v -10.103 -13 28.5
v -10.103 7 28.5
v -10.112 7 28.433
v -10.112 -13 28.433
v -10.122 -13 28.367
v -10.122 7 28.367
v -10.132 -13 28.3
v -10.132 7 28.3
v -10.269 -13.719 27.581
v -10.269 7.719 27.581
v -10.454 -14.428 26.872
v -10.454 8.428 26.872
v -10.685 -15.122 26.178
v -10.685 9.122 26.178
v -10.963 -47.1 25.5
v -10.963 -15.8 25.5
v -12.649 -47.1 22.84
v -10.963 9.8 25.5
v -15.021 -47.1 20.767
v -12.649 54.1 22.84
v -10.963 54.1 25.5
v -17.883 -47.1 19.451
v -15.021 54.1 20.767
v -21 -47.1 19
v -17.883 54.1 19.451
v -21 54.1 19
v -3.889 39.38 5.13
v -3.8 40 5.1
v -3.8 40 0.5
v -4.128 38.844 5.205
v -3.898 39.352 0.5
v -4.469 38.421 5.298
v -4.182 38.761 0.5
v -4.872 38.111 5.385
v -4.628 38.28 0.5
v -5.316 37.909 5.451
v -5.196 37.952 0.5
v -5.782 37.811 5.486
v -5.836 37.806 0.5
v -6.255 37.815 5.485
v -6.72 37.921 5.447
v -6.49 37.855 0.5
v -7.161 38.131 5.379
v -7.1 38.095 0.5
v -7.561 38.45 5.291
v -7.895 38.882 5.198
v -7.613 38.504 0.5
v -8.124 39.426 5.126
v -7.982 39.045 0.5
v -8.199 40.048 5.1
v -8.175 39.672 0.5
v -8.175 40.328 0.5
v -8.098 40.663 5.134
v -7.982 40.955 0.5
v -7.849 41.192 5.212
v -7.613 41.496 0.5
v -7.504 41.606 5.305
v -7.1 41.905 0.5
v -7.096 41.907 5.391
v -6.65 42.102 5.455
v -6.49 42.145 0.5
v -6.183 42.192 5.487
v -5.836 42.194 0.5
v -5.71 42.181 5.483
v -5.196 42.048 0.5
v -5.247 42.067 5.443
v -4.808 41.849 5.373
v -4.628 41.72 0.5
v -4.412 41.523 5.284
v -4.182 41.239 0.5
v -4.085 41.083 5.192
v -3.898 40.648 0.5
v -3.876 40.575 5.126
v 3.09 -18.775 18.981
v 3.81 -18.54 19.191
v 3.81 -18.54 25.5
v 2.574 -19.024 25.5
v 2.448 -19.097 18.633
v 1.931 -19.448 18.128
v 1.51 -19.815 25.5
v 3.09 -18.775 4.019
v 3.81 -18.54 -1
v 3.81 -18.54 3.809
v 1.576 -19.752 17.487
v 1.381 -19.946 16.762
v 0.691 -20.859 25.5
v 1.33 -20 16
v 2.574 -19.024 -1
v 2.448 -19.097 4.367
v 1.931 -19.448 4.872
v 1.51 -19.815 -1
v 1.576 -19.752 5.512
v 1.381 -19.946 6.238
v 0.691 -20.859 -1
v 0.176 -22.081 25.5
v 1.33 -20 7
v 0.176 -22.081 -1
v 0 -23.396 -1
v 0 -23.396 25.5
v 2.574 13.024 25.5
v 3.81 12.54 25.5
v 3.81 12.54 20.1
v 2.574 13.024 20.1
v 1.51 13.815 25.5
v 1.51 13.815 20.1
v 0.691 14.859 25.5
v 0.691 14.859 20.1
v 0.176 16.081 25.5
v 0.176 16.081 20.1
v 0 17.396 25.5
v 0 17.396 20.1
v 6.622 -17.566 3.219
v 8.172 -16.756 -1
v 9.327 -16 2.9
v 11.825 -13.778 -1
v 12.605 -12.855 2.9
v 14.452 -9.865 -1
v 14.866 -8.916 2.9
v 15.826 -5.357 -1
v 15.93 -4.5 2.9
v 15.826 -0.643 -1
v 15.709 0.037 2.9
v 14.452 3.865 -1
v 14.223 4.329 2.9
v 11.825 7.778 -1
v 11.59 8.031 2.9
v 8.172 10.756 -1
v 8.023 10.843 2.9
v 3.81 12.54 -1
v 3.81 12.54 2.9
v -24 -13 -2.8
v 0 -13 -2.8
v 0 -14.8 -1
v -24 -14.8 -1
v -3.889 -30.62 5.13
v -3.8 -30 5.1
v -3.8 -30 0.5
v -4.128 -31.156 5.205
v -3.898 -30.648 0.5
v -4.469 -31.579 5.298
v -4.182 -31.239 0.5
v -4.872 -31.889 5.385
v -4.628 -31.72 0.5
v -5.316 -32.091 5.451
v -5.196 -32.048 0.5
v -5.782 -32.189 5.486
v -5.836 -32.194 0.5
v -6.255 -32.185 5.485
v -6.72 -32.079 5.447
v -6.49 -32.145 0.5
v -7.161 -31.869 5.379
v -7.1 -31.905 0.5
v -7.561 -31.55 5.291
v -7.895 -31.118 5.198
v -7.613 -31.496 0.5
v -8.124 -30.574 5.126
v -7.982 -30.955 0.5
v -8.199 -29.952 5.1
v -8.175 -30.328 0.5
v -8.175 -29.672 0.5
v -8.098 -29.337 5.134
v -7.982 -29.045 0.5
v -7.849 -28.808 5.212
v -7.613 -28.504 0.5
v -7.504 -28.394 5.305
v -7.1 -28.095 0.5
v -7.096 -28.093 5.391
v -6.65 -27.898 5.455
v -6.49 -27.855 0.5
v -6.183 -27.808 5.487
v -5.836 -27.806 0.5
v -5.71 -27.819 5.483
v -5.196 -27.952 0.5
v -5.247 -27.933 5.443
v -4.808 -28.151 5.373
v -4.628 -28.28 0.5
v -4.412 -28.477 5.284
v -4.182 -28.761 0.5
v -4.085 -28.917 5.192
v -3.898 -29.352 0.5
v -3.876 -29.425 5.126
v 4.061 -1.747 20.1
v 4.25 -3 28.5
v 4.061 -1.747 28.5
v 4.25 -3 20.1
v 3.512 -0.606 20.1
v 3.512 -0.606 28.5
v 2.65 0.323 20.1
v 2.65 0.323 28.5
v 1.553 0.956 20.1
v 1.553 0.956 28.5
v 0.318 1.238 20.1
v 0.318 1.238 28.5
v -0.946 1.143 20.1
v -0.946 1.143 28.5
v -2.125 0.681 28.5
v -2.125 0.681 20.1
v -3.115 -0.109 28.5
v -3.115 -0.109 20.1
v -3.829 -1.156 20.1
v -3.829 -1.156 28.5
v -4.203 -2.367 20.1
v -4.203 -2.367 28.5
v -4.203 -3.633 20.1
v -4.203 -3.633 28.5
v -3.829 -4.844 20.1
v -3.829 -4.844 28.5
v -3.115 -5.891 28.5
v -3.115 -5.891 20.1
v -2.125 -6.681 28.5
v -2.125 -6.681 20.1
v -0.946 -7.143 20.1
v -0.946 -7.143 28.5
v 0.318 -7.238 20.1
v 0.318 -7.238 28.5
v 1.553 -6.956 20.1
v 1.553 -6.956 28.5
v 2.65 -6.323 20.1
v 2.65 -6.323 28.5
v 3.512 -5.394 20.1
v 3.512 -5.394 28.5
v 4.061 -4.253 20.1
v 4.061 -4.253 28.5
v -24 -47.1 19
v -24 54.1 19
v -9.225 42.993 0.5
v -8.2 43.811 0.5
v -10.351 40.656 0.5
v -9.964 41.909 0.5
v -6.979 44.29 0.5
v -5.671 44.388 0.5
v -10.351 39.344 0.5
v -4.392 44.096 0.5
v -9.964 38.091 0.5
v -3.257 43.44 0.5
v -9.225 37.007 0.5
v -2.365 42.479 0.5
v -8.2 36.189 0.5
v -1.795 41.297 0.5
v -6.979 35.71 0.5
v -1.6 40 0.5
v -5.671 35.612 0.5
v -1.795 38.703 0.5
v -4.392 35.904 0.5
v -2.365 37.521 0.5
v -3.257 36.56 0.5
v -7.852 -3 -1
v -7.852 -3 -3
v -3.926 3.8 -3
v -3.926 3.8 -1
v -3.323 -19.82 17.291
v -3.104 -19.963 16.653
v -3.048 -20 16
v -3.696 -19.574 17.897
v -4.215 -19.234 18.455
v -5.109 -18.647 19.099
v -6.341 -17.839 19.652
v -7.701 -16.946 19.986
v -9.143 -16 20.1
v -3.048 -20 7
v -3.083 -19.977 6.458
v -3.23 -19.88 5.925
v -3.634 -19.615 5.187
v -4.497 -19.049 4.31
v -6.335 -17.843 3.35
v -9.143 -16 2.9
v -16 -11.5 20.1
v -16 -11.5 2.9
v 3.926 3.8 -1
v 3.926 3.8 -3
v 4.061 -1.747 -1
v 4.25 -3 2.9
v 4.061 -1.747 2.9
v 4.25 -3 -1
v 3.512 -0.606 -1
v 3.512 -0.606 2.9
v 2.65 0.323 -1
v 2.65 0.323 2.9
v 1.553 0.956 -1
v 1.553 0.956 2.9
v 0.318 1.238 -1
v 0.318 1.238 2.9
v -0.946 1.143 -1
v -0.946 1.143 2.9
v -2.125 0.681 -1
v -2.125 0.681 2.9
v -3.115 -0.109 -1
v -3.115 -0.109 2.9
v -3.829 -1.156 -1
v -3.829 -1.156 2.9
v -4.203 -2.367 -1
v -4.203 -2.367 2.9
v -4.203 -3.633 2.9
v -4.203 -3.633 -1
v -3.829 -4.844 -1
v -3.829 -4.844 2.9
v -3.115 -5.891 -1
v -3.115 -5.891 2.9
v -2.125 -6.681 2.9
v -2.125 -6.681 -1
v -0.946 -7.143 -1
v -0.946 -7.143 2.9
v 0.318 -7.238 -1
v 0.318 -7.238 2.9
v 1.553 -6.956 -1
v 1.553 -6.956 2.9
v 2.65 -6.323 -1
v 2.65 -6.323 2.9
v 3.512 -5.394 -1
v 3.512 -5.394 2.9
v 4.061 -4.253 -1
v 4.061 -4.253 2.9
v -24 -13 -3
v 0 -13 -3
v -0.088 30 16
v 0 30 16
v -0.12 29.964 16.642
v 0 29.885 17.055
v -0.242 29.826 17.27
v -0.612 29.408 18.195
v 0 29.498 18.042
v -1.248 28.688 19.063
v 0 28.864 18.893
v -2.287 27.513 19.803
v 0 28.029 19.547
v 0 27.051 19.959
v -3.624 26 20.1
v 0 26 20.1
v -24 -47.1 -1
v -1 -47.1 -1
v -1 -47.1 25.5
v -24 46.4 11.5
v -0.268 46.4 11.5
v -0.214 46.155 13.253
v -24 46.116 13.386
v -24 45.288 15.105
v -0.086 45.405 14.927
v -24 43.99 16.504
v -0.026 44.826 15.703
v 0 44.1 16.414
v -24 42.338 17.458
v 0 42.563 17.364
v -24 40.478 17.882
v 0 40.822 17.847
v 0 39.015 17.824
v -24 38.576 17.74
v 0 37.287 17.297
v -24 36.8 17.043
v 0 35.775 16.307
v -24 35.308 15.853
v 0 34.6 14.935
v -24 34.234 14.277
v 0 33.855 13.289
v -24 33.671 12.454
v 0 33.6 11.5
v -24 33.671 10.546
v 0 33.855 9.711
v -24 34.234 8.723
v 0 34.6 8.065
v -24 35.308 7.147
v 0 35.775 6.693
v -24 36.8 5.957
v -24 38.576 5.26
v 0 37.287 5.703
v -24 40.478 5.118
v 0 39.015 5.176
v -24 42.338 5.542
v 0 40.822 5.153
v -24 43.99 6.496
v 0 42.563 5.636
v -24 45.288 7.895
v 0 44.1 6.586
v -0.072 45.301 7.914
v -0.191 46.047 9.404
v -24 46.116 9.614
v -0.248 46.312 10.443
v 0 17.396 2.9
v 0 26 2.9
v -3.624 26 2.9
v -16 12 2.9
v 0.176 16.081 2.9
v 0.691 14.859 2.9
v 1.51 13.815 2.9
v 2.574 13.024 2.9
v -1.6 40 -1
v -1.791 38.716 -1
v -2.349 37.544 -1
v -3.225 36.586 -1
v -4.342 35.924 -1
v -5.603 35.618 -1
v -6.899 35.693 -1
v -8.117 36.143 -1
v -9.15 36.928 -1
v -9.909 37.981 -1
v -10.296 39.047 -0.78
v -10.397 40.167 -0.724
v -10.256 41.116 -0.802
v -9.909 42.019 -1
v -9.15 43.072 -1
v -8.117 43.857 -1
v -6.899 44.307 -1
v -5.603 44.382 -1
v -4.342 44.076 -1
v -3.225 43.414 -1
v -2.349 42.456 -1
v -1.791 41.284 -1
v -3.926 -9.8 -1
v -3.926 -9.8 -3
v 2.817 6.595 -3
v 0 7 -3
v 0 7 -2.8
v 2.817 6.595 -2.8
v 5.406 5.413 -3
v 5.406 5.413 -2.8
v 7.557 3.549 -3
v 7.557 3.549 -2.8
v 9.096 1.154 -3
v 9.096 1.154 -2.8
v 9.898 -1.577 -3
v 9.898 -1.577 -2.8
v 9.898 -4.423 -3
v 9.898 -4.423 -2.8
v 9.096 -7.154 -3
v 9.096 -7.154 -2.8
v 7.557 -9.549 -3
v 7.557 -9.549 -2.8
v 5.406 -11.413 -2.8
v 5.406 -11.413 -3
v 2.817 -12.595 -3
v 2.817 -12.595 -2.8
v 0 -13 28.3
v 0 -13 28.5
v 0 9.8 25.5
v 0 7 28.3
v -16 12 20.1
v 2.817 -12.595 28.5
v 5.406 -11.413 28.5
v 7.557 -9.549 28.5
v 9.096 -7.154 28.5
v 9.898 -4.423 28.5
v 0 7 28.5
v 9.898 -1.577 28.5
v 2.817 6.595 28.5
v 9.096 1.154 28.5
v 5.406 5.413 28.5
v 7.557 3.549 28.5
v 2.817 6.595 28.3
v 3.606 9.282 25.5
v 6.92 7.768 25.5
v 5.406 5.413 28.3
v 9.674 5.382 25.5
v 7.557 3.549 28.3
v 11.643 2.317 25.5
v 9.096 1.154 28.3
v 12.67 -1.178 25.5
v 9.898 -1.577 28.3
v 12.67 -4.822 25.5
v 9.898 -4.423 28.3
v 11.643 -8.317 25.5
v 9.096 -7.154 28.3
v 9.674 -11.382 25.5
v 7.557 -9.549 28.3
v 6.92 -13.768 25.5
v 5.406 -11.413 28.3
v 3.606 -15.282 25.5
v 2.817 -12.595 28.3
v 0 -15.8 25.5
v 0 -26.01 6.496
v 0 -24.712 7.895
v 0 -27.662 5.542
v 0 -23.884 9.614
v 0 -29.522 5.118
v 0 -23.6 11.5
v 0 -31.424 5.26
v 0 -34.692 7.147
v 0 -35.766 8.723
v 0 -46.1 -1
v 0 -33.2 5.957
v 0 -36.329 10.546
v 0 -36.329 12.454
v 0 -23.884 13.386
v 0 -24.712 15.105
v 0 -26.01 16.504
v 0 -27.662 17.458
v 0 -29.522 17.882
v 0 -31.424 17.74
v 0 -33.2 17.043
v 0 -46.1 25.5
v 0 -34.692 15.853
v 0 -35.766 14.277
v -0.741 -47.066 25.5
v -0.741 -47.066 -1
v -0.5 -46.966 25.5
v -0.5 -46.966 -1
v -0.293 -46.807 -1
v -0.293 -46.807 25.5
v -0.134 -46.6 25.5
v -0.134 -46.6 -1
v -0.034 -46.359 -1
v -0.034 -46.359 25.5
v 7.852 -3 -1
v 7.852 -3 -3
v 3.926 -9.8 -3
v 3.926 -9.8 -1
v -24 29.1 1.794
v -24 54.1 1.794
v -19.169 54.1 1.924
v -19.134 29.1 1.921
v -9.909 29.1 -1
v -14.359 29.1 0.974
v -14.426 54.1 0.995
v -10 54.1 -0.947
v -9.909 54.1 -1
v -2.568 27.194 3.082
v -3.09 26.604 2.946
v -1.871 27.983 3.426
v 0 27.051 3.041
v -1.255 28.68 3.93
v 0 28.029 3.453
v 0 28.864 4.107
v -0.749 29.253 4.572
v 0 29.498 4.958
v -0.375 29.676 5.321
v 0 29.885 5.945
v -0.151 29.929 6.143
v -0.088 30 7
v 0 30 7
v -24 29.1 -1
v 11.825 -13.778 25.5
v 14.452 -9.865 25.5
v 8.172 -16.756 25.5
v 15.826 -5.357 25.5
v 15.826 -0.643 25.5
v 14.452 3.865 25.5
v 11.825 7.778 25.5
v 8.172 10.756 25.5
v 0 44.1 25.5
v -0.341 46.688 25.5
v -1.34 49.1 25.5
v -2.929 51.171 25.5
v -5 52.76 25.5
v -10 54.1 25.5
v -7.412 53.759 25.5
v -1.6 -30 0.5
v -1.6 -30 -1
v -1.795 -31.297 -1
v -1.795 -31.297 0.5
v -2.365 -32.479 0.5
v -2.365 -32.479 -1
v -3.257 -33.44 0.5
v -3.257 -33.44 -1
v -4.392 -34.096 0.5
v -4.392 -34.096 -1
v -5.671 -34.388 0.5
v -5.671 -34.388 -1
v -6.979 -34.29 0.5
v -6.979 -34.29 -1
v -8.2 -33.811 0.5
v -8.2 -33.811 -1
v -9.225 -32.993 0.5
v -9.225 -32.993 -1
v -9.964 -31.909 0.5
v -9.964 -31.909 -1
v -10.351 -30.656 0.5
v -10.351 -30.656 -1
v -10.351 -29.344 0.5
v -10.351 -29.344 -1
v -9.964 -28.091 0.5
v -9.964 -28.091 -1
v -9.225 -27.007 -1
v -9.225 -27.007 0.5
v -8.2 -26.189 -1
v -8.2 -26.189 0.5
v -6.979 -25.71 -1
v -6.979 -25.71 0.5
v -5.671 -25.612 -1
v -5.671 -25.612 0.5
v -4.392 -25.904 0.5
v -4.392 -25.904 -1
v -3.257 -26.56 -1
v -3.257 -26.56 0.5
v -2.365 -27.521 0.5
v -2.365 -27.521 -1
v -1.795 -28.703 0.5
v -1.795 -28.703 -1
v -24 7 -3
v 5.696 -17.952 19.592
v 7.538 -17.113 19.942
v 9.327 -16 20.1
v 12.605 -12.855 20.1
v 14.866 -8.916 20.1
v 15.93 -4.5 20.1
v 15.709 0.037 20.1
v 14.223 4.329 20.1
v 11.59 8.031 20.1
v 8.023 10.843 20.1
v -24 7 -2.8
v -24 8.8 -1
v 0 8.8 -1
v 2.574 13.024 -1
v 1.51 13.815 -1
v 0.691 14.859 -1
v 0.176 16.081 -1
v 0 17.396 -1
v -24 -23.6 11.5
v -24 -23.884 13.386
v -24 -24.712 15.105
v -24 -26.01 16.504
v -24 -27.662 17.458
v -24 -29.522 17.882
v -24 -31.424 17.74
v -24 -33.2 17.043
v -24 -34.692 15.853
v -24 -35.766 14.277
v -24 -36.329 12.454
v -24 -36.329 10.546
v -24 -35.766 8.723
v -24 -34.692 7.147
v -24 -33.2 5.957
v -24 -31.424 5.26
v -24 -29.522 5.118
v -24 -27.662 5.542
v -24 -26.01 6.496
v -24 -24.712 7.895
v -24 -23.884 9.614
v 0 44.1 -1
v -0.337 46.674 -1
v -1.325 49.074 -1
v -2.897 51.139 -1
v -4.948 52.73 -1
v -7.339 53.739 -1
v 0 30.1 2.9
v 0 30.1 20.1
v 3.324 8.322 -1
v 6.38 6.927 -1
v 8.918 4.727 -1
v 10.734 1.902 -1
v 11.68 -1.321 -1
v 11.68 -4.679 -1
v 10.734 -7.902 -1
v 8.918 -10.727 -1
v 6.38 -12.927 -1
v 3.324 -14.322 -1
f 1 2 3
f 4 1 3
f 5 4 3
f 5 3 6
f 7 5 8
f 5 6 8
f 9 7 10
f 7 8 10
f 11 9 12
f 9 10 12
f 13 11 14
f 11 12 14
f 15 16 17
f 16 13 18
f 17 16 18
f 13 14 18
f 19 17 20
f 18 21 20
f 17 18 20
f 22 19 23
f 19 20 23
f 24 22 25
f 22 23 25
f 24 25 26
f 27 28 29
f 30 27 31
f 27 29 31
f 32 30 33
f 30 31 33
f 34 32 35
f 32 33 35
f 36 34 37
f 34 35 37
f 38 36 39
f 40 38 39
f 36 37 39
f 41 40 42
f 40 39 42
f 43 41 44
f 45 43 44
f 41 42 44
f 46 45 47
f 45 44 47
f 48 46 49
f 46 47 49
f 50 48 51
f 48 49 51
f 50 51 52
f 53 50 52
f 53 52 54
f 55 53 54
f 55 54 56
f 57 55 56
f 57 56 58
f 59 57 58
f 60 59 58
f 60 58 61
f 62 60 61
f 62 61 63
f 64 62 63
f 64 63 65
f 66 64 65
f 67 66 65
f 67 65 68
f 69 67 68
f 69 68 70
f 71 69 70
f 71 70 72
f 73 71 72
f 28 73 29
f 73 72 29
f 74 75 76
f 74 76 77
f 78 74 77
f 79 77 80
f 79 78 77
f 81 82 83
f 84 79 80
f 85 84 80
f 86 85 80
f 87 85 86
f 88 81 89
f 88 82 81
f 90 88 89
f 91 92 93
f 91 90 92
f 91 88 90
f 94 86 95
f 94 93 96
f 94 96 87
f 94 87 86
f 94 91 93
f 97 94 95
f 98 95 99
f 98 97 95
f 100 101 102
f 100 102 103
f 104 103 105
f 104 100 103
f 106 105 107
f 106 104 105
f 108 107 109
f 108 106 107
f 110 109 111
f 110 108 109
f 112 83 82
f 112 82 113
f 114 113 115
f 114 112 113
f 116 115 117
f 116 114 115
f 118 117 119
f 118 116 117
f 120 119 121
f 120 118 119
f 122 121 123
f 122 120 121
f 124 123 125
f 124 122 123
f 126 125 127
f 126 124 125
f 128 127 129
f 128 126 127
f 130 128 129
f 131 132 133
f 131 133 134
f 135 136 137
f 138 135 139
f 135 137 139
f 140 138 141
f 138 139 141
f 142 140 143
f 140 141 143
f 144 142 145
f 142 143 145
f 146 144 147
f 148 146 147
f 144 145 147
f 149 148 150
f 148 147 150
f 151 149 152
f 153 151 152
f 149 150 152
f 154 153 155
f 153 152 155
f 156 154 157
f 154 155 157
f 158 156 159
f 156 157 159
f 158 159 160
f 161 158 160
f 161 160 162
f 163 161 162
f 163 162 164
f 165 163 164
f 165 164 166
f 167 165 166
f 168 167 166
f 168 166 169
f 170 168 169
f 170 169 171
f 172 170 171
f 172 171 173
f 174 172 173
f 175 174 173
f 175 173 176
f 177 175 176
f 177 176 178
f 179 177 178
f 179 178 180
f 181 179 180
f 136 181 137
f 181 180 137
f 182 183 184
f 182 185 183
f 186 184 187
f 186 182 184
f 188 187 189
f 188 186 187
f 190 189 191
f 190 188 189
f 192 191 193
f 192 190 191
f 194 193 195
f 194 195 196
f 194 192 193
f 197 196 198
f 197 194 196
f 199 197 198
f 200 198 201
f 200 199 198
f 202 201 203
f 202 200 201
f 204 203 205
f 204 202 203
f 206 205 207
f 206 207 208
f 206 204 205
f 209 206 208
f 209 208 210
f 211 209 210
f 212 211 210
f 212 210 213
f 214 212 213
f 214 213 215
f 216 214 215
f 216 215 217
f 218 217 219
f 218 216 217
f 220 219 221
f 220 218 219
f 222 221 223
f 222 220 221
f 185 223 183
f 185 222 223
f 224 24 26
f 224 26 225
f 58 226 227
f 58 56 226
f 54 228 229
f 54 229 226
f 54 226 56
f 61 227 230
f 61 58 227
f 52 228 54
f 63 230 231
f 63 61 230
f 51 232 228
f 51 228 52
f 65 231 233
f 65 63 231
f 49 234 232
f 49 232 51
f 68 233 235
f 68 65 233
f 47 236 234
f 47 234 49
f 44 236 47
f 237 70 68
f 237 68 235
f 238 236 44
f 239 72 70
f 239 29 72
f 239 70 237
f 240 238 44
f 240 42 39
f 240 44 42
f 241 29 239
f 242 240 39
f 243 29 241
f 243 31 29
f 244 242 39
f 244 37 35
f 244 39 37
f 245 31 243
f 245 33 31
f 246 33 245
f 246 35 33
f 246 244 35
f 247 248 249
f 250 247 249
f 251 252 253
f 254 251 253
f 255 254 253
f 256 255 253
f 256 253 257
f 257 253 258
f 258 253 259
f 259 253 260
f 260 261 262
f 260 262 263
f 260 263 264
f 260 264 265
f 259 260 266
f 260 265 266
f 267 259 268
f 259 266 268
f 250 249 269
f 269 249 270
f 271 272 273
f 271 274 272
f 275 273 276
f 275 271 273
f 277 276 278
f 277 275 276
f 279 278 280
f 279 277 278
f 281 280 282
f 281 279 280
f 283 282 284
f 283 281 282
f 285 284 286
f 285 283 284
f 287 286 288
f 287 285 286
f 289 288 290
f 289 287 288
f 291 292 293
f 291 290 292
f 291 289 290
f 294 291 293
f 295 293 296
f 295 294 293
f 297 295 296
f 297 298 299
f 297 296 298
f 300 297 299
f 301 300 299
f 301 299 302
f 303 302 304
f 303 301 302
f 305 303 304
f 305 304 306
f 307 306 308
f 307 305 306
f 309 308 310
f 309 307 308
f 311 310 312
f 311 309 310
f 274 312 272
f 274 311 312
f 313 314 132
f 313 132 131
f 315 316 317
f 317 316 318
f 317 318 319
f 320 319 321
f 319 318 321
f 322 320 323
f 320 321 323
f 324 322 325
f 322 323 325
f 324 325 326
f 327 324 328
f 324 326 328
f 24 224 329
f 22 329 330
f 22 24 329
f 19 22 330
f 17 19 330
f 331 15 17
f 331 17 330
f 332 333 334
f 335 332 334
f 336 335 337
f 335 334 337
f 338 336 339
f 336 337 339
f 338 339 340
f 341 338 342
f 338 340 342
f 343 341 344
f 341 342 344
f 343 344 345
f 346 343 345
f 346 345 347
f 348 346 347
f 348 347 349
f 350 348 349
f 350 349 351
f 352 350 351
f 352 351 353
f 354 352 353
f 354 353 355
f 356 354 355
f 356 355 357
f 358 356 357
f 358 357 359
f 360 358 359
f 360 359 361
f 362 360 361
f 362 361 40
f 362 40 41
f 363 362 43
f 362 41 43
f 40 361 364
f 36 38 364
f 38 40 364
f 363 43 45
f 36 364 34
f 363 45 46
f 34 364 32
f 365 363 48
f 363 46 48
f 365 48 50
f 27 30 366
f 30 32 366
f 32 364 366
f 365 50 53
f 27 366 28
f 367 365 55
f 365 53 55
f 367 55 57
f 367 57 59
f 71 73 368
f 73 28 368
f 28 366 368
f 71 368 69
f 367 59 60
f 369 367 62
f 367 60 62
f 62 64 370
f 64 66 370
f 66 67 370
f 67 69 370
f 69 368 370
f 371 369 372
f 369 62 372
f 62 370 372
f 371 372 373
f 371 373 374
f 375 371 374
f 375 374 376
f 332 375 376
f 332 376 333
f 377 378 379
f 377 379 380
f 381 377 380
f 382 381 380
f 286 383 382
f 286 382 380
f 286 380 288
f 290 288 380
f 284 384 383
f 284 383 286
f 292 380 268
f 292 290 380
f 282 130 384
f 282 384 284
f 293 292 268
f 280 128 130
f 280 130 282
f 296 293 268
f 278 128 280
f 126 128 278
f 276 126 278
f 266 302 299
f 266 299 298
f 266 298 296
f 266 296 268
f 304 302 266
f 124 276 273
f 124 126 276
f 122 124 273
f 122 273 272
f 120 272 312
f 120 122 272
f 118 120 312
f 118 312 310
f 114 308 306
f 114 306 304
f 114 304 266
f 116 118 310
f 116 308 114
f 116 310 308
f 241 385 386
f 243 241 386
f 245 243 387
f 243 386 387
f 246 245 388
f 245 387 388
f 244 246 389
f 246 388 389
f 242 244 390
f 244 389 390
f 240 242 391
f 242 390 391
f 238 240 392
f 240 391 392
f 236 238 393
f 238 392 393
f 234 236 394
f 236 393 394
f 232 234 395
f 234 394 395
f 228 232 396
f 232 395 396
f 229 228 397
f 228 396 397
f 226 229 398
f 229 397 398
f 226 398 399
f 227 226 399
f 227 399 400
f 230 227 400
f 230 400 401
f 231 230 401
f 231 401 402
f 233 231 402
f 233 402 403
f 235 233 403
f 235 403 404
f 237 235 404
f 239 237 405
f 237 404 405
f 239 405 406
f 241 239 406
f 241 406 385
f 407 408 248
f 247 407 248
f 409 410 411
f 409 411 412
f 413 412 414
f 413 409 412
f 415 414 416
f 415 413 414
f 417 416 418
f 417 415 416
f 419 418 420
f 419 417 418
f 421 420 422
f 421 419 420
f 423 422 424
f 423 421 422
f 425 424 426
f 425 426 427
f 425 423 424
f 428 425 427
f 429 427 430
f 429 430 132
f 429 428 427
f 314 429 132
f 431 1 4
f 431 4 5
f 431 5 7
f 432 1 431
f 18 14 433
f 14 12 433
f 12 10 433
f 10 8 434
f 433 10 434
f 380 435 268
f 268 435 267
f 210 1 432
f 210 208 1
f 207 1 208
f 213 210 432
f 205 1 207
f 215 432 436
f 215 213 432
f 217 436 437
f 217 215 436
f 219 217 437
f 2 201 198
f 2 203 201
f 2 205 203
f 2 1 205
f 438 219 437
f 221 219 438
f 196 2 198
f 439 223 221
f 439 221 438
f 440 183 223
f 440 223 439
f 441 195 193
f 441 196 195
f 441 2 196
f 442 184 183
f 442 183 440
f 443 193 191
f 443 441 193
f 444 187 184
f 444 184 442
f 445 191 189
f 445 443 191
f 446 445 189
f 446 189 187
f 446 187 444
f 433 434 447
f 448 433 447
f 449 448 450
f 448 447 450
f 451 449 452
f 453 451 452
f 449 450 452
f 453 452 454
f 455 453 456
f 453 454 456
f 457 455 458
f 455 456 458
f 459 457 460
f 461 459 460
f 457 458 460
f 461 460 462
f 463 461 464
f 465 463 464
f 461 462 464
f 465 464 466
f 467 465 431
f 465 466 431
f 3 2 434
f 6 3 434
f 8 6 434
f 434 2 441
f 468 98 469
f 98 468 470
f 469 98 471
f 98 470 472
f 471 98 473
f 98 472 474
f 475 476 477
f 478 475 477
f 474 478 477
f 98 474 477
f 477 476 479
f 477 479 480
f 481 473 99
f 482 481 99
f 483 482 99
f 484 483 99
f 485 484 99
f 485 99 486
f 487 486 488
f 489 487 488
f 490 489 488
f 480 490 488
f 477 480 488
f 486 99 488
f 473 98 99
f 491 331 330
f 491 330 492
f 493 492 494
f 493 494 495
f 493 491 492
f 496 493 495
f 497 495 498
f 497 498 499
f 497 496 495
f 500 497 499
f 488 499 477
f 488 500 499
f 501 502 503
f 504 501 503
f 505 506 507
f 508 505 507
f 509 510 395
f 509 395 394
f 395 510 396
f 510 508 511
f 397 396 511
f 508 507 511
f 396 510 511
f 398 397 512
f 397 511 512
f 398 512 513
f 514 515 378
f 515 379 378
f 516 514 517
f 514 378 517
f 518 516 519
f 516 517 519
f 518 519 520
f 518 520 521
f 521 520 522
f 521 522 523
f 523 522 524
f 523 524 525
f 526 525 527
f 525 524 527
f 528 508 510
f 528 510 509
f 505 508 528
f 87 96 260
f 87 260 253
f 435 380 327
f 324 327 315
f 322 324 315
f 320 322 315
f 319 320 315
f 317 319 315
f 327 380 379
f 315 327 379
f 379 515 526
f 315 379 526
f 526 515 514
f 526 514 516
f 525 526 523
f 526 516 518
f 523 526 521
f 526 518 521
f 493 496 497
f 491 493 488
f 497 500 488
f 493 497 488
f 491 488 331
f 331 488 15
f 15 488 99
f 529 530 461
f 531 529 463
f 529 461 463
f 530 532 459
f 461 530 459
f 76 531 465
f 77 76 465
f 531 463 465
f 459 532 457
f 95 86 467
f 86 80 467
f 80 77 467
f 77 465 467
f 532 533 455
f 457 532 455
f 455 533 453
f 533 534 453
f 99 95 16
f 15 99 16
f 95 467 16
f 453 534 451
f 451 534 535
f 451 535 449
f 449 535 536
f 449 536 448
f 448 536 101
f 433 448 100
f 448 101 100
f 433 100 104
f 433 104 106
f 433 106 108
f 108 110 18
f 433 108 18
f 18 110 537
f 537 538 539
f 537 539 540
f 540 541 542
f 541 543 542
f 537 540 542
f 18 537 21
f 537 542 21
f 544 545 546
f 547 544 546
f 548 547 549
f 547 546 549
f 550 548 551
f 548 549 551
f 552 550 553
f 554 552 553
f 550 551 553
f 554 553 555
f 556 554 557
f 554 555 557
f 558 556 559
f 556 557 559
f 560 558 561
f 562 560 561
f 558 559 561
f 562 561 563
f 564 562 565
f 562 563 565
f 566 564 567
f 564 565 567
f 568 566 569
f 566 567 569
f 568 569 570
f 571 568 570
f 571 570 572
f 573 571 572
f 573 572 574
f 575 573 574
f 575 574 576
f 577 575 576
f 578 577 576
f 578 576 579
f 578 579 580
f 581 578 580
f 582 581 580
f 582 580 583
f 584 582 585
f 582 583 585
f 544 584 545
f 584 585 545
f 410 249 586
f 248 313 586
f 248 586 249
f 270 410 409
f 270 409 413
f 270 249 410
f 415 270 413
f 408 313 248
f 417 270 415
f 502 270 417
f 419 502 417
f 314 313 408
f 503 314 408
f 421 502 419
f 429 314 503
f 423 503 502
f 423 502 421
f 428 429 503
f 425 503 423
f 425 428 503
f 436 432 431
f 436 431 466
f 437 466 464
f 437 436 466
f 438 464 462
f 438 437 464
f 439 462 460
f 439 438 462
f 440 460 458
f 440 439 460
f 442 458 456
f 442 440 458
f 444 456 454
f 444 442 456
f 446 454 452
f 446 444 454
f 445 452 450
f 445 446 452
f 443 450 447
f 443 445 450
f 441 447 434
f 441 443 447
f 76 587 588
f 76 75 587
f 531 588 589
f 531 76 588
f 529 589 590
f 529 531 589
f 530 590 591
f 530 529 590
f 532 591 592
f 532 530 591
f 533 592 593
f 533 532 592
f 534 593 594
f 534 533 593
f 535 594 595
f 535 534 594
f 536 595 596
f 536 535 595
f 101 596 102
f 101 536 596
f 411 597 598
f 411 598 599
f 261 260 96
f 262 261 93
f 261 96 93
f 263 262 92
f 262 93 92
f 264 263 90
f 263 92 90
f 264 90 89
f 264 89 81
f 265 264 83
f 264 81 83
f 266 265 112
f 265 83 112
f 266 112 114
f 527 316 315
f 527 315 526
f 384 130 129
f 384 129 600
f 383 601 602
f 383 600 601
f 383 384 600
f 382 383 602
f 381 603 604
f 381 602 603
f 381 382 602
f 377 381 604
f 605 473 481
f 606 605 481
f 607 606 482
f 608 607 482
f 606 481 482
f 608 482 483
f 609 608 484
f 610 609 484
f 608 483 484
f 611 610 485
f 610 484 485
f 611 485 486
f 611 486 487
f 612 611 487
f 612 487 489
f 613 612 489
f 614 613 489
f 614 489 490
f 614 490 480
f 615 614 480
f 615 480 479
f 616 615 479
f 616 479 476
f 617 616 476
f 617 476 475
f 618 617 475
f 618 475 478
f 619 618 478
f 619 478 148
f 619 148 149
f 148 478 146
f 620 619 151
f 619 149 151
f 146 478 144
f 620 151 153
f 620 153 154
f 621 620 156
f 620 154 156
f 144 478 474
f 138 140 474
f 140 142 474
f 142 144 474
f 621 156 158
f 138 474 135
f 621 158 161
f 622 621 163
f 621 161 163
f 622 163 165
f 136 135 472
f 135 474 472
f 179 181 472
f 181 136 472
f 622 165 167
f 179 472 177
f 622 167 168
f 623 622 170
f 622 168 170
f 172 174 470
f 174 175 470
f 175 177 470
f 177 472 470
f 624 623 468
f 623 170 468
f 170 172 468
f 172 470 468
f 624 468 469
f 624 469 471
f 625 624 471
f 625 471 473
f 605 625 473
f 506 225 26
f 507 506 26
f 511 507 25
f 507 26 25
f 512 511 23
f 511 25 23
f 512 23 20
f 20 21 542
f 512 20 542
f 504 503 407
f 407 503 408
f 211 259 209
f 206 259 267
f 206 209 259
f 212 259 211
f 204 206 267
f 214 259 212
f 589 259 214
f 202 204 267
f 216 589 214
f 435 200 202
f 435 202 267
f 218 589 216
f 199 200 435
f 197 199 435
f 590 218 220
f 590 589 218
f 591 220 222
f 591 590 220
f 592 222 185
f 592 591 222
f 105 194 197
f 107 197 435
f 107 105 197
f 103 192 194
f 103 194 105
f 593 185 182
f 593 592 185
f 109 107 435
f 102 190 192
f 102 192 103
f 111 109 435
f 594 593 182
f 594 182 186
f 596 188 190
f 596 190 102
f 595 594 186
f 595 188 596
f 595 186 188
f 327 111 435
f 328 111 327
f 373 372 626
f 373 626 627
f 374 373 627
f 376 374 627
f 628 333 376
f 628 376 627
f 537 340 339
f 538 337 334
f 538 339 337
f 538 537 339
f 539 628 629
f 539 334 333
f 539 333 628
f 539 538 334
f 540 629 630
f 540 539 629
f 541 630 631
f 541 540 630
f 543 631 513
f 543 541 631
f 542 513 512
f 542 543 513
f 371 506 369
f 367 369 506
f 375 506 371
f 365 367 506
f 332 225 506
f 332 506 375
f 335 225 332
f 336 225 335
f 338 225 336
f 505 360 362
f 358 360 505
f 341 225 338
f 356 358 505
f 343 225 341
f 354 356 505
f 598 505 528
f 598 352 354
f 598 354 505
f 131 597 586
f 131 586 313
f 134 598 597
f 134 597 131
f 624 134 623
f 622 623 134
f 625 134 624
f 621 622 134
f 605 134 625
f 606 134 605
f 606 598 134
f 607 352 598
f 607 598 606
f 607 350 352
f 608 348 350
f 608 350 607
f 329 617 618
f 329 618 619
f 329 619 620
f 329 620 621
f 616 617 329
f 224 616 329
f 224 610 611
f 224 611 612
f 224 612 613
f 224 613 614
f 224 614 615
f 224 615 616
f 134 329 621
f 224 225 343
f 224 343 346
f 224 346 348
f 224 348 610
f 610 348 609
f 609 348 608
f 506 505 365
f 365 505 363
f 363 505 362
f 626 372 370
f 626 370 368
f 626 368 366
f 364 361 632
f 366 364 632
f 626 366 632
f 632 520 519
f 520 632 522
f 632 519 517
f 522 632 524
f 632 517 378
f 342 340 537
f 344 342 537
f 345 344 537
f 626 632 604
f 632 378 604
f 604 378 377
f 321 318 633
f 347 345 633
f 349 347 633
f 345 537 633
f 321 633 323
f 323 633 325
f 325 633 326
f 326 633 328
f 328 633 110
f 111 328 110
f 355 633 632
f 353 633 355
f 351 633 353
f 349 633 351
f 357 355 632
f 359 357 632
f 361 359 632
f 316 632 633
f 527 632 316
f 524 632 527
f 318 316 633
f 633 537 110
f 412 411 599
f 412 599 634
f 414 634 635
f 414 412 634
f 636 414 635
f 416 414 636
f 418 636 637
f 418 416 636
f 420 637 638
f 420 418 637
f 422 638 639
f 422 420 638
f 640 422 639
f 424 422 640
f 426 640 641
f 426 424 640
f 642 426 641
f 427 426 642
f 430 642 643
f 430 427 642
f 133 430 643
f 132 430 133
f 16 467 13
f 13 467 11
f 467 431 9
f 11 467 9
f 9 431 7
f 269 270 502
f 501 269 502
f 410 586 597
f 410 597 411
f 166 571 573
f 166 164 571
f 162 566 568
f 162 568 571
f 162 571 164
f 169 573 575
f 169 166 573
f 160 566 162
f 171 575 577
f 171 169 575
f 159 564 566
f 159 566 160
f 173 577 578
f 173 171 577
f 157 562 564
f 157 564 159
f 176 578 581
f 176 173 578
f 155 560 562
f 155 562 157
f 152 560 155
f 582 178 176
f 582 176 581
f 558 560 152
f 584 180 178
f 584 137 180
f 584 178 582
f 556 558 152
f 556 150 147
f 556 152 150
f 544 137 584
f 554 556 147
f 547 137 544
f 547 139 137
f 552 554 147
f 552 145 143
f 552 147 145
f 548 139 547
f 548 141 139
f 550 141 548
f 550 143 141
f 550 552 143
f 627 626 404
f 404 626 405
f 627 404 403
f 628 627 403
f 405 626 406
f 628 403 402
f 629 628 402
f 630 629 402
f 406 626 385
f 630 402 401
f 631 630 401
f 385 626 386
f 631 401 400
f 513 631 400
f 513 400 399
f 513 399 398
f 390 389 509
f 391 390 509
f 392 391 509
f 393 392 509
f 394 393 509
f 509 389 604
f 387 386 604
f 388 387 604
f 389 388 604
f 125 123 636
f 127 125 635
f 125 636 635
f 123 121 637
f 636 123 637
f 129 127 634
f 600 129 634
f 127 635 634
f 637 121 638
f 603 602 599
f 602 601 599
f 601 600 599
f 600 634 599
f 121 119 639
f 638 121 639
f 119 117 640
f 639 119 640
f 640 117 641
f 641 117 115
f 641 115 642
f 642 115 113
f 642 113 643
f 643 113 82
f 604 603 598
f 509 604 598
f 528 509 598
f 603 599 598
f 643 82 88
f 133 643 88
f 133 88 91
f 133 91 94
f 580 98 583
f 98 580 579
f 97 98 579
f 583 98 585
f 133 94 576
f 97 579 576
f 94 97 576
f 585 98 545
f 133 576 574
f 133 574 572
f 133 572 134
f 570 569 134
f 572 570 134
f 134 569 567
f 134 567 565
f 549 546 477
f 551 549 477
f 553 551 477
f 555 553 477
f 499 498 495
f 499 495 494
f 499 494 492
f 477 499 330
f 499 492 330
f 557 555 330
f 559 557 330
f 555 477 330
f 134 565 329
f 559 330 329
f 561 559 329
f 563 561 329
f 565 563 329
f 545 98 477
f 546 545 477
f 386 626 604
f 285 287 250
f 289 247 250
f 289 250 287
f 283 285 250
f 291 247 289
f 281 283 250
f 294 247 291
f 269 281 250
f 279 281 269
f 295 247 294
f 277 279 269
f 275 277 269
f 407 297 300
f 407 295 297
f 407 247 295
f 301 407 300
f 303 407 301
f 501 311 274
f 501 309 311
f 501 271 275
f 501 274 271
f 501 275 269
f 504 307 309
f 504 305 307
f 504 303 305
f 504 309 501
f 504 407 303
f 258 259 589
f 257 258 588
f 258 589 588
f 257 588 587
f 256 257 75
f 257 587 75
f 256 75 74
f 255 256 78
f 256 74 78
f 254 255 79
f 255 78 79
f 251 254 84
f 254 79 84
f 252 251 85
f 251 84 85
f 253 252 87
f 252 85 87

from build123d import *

# Parameters (mm, degrees)
SKETCH_R          = 4.25
PAD_DEPTH         = 28.5
PAD_DEPTH_BACK    = 5
FILLET_R          = 5
SKETCH002_R       = 6.4
POCKET_DEPTH      = 24.001
POCKET_DEPTH_BACK = -16.001
POCKET001_DEPTH   = 3
POCKET002_DEPTH   = 4
POCKET003_DEPTH   = 101.201
POCKET004_DEPTH   = 4
POCKET005_DEPTH   = 16
SKETCH028_R       = 22
POCKET006_DEPTH   = 25
SKETCH031_R       = 2.2
POCKET007_DEPTH   = 9
PAD001_DEPTH      = 17.2
SKETCH038_W       = 50
SKETCH038_H       = 26
POCKET008_DEPTH   = 2
SKETCH039_R       = 4.4
POCKET009_DEPTH   = 1.5
CHAMFER_SIZE      = 1.8
CHAMFER001_SIZE   = 2.8


with BuildPart() as part:
    # Sketch → Pad (new body, two sides)
    with BuildSketch(Plane.XY) as pad_sk:
        with BuildLine():
            ThreePointArc((0, -19), (16, -3), (0, 13))
            Line((0, 44.1), (0, 13))
            ThreePointArc((0, 44.1), (-2.928932, 51.171068), (-10, 54.1))
            Line((-24, 54.1), (-10, 54.1))
            Line((-24, 54.1), (-24, -47.1))
            Line((-24, -47.1), (-1, -47.1))
            ThreePointArc((-1, -47.1), (-0.292893, -46.807107), (0, -46.1))
            Line((0, -19), (0, -46.1))
        make_face()
        with Locations((0, -3)):
            Circle(SKETCH_R, mode=Mode.SUBTRACT)
    extrude(amount=PAD_DEPTH)
    extrude(pad_sk.sketch, amount=-PAD_DEPTH_BACK)

    # Fillet
    fillet_edges = [part.edges().sort_by_distance(p)[0] for p in [
        (0, 13, 11.75),
        (0, -19, 11.75),
    ]]
    fillet(fillet_edges, radius=FILLET_R)

    # Sketch002 → Pocket (cut, two sides)
    with BuildSketch(Plane.YZ) as pocket_sk:
        with Locations((-30, 11.5)):
            Circle(SKETCH002_R)
        with Locations((40, 11.5)):
            Circle(SKETCH002_R)
    extrude(amount=-POCKET_DEPTH, mode=Mode.SUBTRACT)
    extrude(pocket_sk.sketch, amount=-POCKET_DEPTH_BACK, mode=Mode.SUBTRACT)

    # Sketch013 → Pocket001 (cut)
    with BuildSketch(Plane.XY.offset(28.5)):
        with BuildLine():
            ThreePointArc((0, -13), (10, -3), (0, 7))
            Line((-40, 7), (0, 7))
            Line((-40, 7), (-40, 60))
            Line((-40, 60), (30, 60))
            Line((30, 60), (30, -60))
            Line((30, -60), (-40, -60))
            Line((-40, -60), (-40, -13))
            Line((-40, -13), (0, -13))
        make_face()
    extrude(amount=-POCKET001_DEPTH, mode=Mode.SUBTRACT)

    # Sketch024 → Pocket002 (cut)
    with BuildSketch(Plane(origin=(0, 0, -5), x_dir=(1, 0, 0), z_dir=(0, 0, -1))):
        with BuildLine():
            Line((0, 13), (-40, 13))
            Line((-40, 13), (-40, 65))
            Line((-40, 65), (24, 65))
            Line((24, 65), (24, -65))
            Line((24, -65), (-40, -65))
            Line((-40, -7), (-40, -65))
            Line((-40, -7), (0, -7))
            ThreePointArc((0, -7), (10, 3), (0, 13))
        make_face()
    extrude(amount=-POCKET002_DEPTH, mode=Mode.SUBTRACT)

    # Sketch029 → Pocket003 (cut, through all)
    with BuildSketch(Plane(origin=(0, 54.1, 0), x_dir=(-1, 0, 0), z_dir=(0, 1, 0))):
        with BuildLine():
            ThreePointArc((32, 30), (13.221825, 37.778175), (21, 19))
            Line((21, 19), (32, 19))
            Line((32, 30), (32, 19))
        make_face()
    extrude(amount=-POCKET003_DEPTH, mode=Mode.SUBTRACT)

    # Sketch027 → Pocket004 (cut)
    with BuildSketch(Plane(origin=(0, 0, -5), x_dir=(1, 0, 0), z_dir=(0, 0, -1))):
        Polygon((3.925982, 9.8), (-3.925982, 9.8), (-7.851964, 3), (-3.925982, -3.8), (3.925982, -3.8), (7.851964, 3), align=None)
    extrude(amount=-POCKET004_DEPTH, mode=Mode.SUBTRACT)

    # Sketch025 → Pocket005 (cut, symmetric)
    with BuildSketch(Plane.YZ):
        with BuildLine():
            Line((-16, 20.1), (26, 20.1))
            ThreePointArc((30, 16), (28.864001, 18.892928), (26, 20.1))
            Line((30, 16), (30, 7))
            ThreePointArc((26, 2.9), (28.864001, 4.107072), (30, 7))
            Line((26, 2.9), (-16, 2.9))
            ThreePointArc((-20, 7), (-18.864001, 4.107072), (-16, 2.9))
            Line((-20, 7), (-20, 16))
            ThreePointArc((-16, 20.1), (-18.864001, 18.892928), (-20, 16))
        make_face()
    extrude(amount=POCKET005_DEPTH, both=True, mode=Mode.SUBTRACT)

    # Sketch028 → Pocket006 (cut)
    with BuildSketch(Plane(origin=(0, 54.1, 0), x_dir=(-1, 0, 0), z_dir=(0, 1, 0))):
        with Locations((21, -20)):
            Circle(SKETCH028_R)
    extrude(amount=-POCKET006_DEPTH, mode=Mode.SUBTRACT)

    # Sketch031 → Pocket007 (cut)
    with BuildSketch(Plane(origin=(0, 0, -1), x_dir=(1, 0, 0), z_dir=(0, 0, -1))):
        with Locations((-6, 30)):
            Circle(SKETCH031_R)
        with Locations((-6, -40)):
            Circle(SKETCH031_R)
    extrude(amount=-POCKET007_DEPTH, mode=Mode.SUBTRACT)

    # Sketch032 → Pad001 (new body)
    with BuildSketch(Plane.XY.offset(2.9)):
        Polygon((0, -22), (-16, -11.5), (-16, -22), align=None)
        Polygon((-16, 12), (0, 30.1), (-16, 30.1), align=None)
    extrude(amount=PAD001_DEPTH)

    # Sketch038 → Pocket008 (cut)
    with BuildSketch(Plane(origin=(0, 0, -5), x_dir=(1, 0, 0), z_dir=(0, 0, -1))):
        with Locations((-10, 2)):
            Rectangle(SKETCH038_W, SKETCH038_H)
    extrude(amount=-POCKET008_DEPTH, mode=Mode.SUBTRACT)

    # Sketch039 → Pocket009 (cut)
    with BuildSketch(Plane(origin=(0, 0, -1), x_dir=(1, 0, 0), z_dir=(0, 0, -1))):
        with Locations((-6, 30)):
            Circle(SKETCH039_R)
        with Locations((-6, -40)):
            Circle(SKETCH039_R)
    extrude(amount=-POCKET009_DEPTH, mode=Mode.SUBTRACT)

    # Chamfer
    chamfer_edges = [part.edges().sort_by_distance(p)[0] for p in [
        (-12, -13, -1),
        (10, -3, -1),
        (-12, 7, -1),
    ]]
    chamfer(chamfer_edges, length=CHAMFER_SIZE)

    # Chamfer001
    chamfer001_edges = [part.edges().sort_by_distance(p)[0] for p in [
        (-5.481285, 7, 25.5),
        (10, -3, 25.5),
        (-5.481285, -13, 25.5),
    ]]
    chamfer(chamfer001_edges, length=CHAMFER001_SIZE)


solid = part.part
